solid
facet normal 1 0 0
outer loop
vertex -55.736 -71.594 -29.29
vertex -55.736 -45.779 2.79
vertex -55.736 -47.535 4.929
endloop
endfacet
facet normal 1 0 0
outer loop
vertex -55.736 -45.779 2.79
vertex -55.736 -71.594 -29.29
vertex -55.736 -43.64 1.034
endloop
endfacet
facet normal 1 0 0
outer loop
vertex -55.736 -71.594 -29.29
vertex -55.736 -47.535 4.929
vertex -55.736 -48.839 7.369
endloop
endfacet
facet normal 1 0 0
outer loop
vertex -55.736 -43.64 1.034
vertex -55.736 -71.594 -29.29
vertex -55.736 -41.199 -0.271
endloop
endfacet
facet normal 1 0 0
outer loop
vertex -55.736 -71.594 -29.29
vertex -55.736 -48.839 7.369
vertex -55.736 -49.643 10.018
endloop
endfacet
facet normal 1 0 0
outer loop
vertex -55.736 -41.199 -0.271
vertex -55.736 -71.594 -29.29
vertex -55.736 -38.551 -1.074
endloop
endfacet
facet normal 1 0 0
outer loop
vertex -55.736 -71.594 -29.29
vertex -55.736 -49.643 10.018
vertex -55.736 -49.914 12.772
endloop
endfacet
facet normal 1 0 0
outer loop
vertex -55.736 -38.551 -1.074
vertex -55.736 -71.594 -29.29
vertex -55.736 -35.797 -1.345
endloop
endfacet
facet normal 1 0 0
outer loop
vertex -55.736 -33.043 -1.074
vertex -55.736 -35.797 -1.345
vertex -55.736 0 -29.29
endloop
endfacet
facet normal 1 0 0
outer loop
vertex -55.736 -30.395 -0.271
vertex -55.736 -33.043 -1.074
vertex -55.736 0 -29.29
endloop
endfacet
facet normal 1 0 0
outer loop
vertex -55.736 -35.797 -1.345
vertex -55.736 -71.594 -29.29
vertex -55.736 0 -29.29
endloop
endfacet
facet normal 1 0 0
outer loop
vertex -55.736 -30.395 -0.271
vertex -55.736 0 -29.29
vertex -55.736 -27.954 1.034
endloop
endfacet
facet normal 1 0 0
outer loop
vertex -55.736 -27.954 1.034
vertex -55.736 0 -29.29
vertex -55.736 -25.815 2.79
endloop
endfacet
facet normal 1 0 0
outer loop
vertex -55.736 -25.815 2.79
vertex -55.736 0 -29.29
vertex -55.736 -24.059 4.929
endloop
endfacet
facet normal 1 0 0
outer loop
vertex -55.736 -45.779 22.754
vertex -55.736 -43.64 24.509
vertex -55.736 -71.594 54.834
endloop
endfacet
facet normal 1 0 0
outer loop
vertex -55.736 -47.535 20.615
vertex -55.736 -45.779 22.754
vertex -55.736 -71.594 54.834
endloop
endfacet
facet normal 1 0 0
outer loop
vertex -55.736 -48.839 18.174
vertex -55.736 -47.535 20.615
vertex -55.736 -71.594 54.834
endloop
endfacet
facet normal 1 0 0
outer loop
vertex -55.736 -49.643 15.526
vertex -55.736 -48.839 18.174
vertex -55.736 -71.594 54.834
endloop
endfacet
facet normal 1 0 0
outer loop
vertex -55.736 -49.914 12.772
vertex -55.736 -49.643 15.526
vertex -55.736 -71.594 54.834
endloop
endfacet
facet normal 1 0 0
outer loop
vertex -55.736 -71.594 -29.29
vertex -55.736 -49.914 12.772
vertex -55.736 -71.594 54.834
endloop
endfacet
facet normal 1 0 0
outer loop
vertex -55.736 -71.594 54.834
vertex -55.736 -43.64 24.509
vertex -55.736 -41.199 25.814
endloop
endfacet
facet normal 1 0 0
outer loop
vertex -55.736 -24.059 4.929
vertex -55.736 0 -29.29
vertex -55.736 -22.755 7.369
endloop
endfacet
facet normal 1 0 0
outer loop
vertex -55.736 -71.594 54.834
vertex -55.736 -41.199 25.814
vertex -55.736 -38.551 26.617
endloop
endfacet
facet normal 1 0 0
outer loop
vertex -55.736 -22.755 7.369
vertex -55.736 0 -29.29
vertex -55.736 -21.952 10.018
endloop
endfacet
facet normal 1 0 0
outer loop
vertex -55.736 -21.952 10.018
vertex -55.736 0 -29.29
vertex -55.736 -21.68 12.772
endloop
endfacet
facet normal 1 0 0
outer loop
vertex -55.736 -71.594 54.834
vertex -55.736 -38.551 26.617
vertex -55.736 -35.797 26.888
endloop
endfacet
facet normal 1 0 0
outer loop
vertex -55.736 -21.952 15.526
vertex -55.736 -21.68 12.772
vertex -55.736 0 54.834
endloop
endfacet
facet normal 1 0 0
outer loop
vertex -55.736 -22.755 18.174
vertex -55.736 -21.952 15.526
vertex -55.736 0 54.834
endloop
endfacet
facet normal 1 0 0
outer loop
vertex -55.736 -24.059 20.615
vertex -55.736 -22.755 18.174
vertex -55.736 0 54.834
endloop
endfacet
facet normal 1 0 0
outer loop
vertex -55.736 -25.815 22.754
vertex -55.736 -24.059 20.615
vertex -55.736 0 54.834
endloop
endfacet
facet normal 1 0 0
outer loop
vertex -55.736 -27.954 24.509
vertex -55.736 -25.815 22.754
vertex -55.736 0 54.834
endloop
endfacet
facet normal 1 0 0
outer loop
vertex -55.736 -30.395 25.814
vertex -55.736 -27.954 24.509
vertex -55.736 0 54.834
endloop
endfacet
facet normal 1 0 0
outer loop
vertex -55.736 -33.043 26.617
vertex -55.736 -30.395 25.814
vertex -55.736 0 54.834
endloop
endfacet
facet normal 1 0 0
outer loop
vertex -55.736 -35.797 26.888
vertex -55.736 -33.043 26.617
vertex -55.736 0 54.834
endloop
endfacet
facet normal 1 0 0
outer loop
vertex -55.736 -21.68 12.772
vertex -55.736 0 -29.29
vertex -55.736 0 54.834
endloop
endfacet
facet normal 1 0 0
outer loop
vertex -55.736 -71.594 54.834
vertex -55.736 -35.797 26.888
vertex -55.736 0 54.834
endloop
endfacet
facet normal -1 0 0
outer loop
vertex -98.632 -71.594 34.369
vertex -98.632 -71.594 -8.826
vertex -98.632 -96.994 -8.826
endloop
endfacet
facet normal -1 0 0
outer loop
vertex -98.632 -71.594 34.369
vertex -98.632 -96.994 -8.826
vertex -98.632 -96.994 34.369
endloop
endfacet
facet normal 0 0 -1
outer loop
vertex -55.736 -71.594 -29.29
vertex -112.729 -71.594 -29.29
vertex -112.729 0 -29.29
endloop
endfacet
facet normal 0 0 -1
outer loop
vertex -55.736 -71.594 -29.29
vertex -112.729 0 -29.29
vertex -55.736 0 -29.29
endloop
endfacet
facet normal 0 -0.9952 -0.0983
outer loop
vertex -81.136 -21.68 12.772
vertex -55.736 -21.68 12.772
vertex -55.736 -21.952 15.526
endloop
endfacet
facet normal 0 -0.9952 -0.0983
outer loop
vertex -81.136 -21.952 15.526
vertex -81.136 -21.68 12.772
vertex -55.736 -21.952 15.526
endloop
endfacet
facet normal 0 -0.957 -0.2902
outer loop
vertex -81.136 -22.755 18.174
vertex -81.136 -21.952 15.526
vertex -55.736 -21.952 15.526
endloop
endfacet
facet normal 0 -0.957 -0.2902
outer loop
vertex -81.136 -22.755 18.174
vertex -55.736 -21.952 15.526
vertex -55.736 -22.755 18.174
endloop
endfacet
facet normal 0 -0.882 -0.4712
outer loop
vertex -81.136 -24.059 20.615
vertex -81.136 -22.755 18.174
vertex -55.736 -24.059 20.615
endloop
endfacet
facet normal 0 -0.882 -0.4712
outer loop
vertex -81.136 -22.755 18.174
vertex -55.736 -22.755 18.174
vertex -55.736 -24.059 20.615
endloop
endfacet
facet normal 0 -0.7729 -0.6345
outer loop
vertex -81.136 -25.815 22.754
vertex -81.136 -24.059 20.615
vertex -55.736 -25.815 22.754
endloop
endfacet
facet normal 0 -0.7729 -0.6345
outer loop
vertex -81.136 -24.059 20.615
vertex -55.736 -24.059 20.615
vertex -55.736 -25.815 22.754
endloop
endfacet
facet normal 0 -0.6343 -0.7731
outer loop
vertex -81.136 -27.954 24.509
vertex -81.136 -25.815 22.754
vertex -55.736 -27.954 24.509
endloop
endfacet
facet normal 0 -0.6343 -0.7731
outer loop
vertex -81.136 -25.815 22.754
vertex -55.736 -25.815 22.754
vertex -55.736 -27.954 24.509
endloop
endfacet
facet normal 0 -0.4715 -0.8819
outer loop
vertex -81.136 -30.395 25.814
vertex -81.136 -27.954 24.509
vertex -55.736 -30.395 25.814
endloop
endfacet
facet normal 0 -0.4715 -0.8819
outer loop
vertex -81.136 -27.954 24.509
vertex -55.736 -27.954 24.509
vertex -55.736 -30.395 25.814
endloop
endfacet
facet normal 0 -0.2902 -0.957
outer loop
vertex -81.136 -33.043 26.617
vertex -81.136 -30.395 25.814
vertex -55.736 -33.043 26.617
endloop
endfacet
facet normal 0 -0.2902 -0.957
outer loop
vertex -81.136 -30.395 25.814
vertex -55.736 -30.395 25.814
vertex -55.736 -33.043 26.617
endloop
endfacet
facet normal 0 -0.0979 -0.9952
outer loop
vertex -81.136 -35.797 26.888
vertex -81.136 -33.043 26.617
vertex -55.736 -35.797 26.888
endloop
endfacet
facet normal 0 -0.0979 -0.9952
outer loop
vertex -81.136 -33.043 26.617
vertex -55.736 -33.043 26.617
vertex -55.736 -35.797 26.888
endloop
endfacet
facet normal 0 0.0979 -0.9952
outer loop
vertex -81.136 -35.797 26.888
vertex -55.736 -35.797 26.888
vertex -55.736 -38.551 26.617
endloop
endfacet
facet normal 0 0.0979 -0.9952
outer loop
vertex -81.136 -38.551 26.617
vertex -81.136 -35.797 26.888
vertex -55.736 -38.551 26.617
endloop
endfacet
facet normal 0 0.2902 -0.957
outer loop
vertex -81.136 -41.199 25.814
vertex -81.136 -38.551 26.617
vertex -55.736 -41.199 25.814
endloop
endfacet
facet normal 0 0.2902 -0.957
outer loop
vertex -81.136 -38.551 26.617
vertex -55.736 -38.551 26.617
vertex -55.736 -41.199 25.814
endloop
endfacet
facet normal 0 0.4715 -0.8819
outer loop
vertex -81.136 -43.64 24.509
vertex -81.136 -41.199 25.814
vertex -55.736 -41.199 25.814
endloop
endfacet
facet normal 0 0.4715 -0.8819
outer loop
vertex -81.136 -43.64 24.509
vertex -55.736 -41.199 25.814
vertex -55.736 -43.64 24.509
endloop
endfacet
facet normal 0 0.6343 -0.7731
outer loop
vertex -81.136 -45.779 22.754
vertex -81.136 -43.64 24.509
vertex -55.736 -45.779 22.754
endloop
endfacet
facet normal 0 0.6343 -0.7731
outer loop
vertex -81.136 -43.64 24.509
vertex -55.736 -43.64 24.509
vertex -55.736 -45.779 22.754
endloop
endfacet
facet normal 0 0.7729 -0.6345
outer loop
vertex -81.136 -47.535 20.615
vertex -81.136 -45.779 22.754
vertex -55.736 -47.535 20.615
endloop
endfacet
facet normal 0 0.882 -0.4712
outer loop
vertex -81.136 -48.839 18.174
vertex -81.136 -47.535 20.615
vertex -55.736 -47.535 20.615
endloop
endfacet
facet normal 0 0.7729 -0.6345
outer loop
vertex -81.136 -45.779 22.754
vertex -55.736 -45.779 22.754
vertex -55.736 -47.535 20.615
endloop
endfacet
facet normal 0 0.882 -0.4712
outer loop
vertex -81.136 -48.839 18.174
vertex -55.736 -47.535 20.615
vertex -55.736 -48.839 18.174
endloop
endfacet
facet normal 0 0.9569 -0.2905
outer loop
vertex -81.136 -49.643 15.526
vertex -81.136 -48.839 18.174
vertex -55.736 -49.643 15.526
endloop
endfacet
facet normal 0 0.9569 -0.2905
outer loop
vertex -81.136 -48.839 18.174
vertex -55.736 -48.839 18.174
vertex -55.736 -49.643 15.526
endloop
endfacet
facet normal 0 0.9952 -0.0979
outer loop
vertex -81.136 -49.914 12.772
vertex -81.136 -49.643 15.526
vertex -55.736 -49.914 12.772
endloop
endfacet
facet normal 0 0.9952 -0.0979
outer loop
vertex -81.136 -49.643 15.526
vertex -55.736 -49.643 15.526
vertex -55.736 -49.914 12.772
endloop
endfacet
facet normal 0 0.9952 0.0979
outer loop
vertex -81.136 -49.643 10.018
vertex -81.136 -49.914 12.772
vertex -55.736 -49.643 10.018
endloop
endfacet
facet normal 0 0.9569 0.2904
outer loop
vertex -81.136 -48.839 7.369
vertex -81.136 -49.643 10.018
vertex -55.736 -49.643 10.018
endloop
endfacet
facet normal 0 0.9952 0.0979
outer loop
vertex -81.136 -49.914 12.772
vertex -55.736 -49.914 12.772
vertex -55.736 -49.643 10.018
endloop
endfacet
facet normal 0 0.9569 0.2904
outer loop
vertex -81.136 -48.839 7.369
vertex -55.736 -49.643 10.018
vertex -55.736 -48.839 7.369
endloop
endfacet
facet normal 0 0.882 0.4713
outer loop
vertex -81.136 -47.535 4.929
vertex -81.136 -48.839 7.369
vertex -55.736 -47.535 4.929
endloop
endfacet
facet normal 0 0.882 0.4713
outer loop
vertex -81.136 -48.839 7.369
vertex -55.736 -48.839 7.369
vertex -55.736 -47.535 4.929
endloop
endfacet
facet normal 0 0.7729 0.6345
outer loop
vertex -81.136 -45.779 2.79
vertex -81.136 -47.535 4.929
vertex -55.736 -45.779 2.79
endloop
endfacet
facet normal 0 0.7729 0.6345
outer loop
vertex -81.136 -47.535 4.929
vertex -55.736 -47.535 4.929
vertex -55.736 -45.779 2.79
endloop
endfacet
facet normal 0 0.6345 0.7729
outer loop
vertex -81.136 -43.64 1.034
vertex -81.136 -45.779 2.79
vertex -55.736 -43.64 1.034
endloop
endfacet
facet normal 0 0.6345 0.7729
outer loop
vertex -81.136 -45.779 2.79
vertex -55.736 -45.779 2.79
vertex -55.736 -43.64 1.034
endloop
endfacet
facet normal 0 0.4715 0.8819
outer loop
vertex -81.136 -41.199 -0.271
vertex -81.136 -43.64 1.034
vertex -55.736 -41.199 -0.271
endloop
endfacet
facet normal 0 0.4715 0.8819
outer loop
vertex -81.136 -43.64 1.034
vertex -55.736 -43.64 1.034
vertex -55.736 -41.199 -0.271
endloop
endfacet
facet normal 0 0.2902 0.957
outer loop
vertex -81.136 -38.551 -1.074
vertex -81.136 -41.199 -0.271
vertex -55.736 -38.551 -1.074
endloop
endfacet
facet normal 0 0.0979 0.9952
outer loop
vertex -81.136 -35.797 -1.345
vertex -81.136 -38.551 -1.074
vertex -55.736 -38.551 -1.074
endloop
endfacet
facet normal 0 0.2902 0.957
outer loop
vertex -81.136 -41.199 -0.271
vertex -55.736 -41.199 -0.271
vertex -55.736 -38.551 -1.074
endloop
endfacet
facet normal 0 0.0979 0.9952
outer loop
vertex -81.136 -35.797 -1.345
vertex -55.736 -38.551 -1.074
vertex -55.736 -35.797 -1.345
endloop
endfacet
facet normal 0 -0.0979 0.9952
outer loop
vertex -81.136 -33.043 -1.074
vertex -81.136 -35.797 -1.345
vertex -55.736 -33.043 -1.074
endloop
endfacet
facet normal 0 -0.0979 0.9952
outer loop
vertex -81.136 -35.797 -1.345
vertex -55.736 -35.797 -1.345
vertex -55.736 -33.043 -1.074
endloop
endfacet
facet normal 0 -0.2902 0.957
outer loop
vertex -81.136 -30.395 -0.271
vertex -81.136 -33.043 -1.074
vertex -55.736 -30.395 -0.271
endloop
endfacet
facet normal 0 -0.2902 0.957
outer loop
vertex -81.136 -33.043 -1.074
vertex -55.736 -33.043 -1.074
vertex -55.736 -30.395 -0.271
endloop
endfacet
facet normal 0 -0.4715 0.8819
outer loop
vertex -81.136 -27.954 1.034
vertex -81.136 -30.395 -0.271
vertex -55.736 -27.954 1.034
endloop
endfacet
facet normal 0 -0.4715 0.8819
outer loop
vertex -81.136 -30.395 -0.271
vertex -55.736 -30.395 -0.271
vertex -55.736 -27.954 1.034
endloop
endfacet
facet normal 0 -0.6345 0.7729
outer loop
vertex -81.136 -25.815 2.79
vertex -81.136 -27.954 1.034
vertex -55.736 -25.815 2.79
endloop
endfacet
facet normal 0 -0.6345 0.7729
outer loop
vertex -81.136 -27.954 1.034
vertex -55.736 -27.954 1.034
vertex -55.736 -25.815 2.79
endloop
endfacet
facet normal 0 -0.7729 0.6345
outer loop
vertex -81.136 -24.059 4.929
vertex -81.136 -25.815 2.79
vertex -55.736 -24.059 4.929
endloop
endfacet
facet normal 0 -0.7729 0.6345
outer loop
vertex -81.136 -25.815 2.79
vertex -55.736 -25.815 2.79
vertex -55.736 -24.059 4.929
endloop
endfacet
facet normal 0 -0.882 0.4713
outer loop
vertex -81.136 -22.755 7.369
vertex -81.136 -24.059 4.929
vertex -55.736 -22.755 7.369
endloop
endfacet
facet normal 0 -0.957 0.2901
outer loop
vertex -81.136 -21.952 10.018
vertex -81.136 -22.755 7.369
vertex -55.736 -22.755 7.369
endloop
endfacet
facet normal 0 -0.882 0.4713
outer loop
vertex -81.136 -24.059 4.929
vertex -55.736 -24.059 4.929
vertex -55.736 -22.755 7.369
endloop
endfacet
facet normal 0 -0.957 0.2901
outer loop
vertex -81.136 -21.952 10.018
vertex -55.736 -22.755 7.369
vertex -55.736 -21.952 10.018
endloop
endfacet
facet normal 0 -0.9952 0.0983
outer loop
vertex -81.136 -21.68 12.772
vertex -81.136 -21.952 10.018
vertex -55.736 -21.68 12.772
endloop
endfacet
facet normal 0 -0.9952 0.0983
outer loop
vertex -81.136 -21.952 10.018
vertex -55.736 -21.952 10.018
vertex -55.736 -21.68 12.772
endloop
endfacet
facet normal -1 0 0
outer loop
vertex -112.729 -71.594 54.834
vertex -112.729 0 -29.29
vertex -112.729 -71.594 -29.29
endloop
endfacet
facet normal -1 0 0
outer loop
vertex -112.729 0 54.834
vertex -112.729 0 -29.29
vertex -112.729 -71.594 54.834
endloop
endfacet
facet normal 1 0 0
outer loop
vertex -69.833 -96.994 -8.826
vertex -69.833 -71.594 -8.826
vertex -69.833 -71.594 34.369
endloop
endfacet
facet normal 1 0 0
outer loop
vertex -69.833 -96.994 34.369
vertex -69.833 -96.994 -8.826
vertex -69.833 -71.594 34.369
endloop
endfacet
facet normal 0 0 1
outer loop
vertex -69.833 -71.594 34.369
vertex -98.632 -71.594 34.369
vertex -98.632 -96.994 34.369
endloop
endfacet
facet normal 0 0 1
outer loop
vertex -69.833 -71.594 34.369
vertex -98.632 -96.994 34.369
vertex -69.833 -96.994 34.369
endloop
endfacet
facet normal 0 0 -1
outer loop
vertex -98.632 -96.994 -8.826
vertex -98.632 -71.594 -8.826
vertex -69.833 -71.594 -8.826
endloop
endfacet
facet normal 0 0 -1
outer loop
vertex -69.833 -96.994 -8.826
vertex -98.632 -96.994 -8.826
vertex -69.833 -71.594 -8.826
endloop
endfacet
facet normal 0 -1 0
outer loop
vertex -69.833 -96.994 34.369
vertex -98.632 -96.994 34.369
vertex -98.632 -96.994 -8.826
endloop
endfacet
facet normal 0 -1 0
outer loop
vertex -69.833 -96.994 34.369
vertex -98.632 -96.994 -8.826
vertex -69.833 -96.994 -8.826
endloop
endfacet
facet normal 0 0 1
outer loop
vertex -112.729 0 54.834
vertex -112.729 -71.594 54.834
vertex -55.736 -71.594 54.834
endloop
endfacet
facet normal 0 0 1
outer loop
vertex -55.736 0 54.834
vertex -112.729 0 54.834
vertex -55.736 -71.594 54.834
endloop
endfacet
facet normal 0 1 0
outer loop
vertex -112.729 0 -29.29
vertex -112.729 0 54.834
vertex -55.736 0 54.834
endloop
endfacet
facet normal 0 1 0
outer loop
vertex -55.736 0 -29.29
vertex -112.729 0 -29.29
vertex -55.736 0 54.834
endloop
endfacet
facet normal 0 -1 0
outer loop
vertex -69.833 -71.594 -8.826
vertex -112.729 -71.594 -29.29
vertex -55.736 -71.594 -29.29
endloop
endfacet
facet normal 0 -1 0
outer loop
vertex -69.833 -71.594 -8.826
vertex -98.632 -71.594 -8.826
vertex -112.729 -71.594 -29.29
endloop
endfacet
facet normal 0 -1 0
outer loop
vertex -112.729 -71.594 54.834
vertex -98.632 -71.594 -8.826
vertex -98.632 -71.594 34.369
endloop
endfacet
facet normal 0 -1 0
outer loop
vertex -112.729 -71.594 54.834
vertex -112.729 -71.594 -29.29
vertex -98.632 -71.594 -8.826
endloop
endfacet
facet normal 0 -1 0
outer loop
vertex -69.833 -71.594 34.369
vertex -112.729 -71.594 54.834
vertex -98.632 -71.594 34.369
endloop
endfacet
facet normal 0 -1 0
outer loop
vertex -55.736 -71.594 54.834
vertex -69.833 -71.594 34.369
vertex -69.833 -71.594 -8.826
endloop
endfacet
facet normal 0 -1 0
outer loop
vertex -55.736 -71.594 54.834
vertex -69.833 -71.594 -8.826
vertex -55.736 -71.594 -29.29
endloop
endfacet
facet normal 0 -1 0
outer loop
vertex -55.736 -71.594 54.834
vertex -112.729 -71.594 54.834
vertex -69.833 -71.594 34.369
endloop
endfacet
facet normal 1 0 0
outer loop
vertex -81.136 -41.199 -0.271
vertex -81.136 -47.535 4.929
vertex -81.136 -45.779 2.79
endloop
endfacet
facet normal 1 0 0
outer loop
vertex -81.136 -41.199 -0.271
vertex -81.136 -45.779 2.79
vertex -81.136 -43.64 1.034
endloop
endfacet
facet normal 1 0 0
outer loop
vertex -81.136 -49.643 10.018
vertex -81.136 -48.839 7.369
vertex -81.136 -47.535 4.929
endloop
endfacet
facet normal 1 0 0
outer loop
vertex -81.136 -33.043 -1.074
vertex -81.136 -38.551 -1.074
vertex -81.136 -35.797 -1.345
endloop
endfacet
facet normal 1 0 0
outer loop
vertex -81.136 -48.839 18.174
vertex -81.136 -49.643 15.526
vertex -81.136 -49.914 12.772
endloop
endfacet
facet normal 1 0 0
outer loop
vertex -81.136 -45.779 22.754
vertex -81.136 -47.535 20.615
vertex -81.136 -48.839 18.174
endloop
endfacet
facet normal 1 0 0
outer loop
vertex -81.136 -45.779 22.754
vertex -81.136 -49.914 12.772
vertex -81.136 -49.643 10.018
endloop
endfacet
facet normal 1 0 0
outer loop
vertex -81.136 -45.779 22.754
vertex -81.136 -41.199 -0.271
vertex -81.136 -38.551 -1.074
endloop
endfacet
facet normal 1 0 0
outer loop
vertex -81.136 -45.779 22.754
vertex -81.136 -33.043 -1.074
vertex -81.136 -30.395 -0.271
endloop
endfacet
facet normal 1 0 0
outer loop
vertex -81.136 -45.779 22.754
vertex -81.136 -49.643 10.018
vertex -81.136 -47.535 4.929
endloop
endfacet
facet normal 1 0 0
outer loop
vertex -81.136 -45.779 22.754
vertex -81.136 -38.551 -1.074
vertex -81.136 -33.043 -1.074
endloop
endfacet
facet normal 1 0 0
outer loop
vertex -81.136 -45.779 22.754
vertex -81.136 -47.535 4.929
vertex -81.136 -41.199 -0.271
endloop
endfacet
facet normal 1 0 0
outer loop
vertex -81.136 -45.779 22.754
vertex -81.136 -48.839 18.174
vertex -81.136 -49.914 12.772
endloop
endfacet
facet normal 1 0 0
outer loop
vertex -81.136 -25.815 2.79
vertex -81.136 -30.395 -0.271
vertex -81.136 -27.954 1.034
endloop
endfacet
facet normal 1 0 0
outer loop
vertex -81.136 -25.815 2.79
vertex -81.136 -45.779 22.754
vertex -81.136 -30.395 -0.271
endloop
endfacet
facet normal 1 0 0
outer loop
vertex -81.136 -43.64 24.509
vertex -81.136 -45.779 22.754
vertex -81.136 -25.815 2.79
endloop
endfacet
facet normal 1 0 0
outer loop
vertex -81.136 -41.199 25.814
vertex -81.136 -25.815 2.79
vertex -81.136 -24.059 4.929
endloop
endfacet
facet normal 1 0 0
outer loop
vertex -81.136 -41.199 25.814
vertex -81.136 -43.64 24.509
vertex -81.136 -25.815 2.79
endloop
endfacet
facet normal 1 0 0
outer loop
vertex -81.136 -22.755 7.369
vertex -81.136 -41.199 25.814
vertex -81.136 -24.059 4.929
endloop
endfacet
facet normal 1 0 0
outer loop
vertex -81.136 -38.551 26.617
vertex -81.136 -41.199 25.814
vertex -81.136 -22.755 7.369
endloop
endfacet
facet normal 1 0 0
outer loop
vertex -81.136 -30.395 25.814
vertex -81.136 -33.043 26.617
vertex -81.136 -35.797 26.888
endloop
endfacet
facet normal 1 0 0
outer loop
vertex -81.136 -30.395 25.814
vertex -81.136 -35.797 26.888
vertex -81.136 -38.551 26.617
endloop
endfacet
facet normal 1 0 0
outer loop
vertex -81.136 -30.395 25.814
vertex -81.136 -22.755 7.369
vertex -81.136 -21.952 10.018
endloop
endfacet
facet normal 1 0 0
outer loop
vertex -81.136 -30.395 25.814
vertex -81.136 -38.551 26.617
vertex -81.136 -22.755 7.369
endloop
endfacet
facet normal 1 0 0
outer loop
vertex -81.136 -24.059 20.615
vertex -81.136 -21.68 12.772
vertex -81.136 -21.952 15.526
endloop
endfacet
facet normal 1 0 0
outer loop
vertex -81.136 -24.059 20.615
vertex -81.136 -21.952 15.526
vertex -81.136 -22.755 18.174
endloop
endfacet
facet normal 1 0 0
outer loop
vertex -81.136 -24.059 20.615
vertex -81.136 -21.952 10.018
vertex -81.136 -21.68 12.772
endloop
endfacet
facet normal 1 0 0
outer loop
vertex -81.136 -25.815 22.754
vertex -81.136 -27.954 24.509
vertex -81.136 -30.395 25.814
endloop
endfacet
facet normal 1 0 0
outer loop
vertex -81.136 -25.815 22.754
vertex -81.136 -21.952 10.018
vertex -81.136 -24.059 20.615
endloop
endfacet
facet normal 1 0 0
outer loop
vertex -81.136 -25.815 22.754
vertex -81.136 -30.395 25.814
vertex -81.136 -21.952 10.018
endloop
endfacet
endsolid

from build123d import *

# Parameters (mm, degrees)
F0_W     = 56.9933205843
F0_H     = 84.123885259
F1_DEPTH = 71.59423
F2_R     = 14.1167569705
F3_DEPTH = 25.4
F4_W     = 28.7987589836
F4_H     = 43.1953351945
F5_DEPTH = 25.4


with BuildPart() as f1:
    # F0 (on Front) → F1 (new body)
    with BuildSketch(Plane.XZ):
        with Locations((-84.2327773571, 12.7716520801)):
            Rectangle(F0_W, F0_H)
    extrude(amount=F1_DEPTH)

    # F2 (on face) → F3 (cut)
    with BuildSketch(Plane.YZ.offset(-55.736117065)):
        with Locations((-35.797115, 12.7716520801)):
            Circle(F2_R)
    extrude(amount=-F3_DEPTH, mode=Mode.SUBTRACT)

    # F4 (on face) → F5 (join)
    with BuildSketch(Plane.XZ.offset(71.59423)):
        with Locations((-84.2327773571, 12.7716520801)):
            Rectangle(F4_W, F4_H)
    extrude(amount=F5_DEPTH)


solid = f1.part
